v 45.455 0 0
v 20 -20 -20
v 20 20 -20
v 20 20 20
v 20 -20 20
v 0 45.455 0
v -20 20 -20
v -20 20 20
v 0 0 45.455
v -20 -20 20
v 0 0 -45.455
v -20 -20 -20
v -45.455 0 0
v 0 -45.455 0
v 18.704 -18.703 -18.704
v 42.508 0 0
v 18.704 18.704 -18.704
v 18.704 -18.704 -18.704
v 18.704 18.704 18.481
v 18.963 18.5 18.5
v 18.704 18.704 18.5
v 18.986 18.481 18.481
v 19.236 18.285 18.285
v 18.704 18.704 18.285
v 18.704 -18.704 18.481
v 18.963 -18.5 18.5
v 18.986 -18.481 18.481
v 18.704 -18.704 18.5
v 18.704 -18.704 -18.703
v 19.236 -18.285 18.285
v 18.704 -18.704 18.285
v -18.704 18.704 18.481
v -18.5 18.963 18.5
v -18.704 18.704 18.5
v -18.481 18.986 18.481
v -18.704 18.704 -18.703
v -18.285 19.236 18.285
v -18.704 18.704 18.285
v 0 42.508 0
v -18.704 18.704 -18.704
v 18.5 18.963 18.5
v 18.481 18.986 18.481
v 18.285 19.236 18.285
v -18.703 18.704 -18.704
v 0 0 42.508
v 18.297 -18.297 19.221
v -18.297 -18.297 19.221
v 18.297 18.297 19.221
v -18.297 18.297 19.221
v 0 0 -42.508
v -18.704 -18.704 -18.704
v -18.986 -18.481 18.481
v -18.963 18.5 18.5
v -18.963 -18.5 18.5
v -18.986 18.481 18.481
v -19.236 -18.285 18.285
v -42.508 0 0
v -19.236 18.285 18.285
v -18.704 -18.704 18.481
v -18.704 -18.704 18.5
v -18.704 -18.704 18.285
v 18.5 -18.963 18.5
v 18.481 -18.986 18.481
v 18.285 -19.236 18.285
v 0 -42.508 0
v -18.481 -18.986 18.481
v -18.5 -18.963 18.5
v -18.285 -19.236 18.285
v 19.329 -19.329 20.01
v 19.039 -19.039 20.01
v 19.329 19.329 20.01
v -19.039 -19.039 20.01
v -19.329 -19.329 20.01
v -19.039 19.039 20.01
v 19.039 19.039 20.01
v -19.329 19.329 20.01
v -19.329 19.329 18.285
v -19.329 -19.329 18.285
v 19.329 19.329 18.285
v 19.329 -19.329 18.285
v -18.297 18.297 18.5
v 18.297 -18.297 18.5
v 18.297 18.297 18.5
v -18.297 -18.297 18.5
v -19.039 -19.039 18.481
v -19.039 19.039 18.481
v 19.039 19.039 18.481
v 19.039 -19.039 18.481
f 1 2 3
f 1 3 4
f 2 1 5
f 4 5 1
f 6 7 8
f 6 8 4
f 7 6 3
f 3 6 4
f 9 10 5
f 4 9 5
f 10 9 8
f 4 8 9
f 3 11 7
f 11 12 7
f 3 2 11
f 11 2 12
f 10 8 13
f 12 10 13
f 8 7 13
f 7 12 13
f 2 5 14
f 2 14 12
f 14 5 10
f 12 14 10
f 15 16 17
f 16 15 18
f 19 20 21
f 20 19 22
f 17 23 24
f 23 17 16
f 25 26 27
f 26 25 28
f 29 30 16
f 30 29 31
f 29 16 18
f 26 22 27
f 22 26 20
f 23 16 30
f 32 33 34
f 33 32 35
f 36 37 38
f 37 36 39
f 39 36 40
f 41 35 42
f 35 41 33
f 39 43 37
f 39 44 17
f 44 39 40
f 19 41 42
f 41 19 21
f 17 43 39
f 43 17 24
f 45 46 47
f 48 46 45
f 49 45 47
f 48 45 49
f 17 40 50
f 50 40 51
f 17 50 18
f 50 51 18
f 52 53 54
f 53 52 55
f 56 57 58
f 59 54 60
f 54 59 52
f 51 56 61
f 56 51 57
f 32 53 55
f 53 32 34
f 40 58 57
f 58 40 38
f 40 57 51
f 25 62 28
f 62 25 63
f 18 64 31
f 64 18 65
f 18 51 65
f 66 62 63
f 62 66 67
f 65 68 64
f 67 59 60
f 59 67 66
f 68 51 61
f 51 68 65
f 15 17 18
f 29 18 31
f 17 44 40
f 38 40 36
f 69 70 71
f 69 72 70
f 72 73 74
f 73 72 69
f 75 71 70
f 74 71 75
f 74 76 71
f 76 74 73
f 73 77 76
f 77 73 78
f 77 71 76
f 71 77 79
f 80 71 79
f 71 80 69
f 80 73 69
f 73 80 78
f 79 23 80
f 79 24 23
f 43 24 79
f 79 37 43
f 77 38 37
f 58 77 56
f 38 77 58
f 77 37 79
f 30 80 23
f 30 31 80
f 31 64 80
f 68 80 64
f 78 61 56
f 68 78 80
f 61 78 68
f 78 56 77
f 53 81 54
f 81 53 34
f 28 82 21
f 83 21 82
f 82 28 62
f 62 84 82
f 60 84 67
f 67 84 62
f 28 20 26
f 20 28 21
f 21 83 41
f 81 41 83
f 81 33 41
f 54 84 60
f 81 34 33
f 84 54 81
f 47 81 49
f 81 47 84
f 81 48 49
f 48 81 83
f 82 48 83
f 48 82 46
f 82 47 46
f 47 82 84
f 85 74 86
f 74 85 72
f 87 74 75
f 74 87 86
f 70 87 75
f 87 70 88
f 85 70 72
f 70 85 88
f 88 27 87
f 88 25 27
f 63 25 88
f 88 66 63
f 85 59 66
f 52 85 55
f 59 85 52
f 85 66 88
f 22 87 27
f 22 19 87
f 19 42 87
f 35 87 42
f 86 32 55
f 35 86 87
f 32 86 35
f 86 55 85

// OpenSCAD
arete = 40;
hauteur = 25.455; // hauteur pyramide
paroi = 1.5;
echelleReductionAjustementBouchon = 0.985;
libEcho=false;


hauteurInterieure = hauteur - 1.1 * paroi;
areteInterieure = hauteurInterieure * arete / hauteur;

echo(areteInterieure);

//poly_creux();
//decoupe_bouchon();
corps_ouvert();
bouchon();


module corps_ouvert() {
//    rotate([180, 0, 0])
	difference() {
		poly_creux();
		decoupe_bouchon();
	}
}

module bouchon() {
	difference () {
        intersection() {
            union() {
                poly_creux();
                supplement_feuillure_bouchon(echelleReductionAjustementBouchon);
            }
            decoupe_bouchon(echelleReductionAjustementBouchon);
        }
	}
}

module poly_creux() {
	difference() {
        stellated_hexahedron(arete, hauteur);
        stellated_hexahedron(areteInterieure, hauteurInterieure);
	}
}

module decoupe_bouchon(scale=1) {
    distance = arete/2;
    scale2 = 1.15*pow(scale,8);
	rotate([0,0,45]) translate([0,0, distance+0.01])
		cylinder(999, r=arete*0.8, $fn=4, center=false);
	rotate([0,0,45]) translate([0,0, distance-paroi*scale2+0.01])
		cylinder(paroi*scale2, r=(arete-paroi)*0.71*scale, $fn=4, center=false);
}

module supplement_feuillure_bouchon(scale=1) {
    distance = arete/2;
    rotate([0,0,45]) translate([0,0, distance-paroi])
    difference() {   
		cylinder(paroi+1, r=(arete-paroi)*0.71*scale, $fn=4, center=false);
		cylinder(paroi+1, r=(arete-2*paroi)*0.71*scale, $fn=4, center=false);
    }
}

module stellated_hexahedron(side, height) {
    union() {
        cube(side, center=true);
        copy_mirror([1,1,1])
        for (i = [1:3]) {
            rotate(a=360/3*i, v=[1,1,1]) translate([0,0, side/2-0.0001])
            pyramid(side=side, height=height, square=true, centerHorizontal=true, centerVertical=false);
        }
    }
}

module copy_mirror(vec=[0,0,0])
{
    children();
    rotate(a=360/6, v=[1,1,1]) mirror(vec) children();
}




/*   	MY Libraries v1.1 - Common Components
		Unless stated otherwise, all modules
		are by Randy Young <dadick83@hotmail.com>
		2010, 2011.   License, GPL v2 or later
**************************************************/

displayMode= rezScreen();  // (resolution)

function rezPrinter()=0;
function rezScreen()=1;

function resolution(value) =
	displayMode==1 ? 360 : value*2*3.141592; // ~1mm resolution for printer
$fn=resolution(4); // default for cylinder & sphere

function vectorDistance(v1, v2) =
	sqrt((pow(v2[0]-v1[0],2)+pow(v2[1]-v1[1],2))+pow(v2[2]-v1[2],2));
// function for linear measurement from 2, 3d vectors)

ep=0.01; //small number to avoid overlaps (non-manifold models)
in=25.4; //inches to millimeter conversion


/***** ROTATION & TRANSLATION SHORTCUTS  *****
Used for common, easy to type single axis moves 
with names I can actually remember (since I never
get the rotation directions right on first try. :o)   */

function tighten (angle=90) =
		[0,0,-1*angle];

function loosen (angle=90) =
		[0,0,angle];

function righty (angle=90) =
		[0,angle,0];

function lefty (angle=90) =
		[0,-1*angle,0];

function backward (angle=90) =
		[-1*angle,0,0];

function forward (angle=90) =
		[angle,0,0];

function push(distance=1) =
		[0,distance,0]; 

function lift(distance=1) =
		[0,0,distance];

function slide(distance=1) =
		[distance,0,0]; 

/*************************************************
BASIC ENGINEERING SHAPES */

module hex (width=10, height=10, flats= true, center=false){
	radius= (flats == true ? width/sin(60)/2 : width/2 );
		cylinder (r=radius, h=height, center=center, $fn=6);
}

module equilateralTriangle (side=10, height=10, center=false){
	translate(center==true ? [-side/2,-sqrt(3)*side/6,-height/2] : [0,0,0])	
		linear_extrude(height=height)
			polygon(points=[[0,0],[side,0],[side/2,sqrt(3)*side/2]]);
}

module pyramid(side=10, height=-1, square=false, centerHorizontal=true, centerVertical=false){
// creates a 3 or 4 sided pyramid.  -1 height= tetrahedron or Johnson's Solid square pyramid
	mHeight= height!=-1 ? height:
		square == true ? (1/sqrt(2))*side:		//square
			sqrt(6)/3*side;						//tetra
	vert= centerVertical!=true ? [0,0,0]:
		square==false ? [0,0,-mHeight/4] :	 //inscribes a tetra inside a sphere, not 1/2 ht
			[0,0,-mHeight/3];	//for squares, center=false inscribes, so true is just 1/2 ht
	horiz= centerHorizontal!= true ? [0,0,0] :
		square == true ? [-side/2, -side/2, 0] : 	//square
			[-side/2,-sqrt(3)*side/6 ,0];			//tetra
	translate(vert+horiz){
		if (square == true){
			polyhedron (	points = [[0,0,0],[0,side,0],[side,side,0],
								[side,0,0],[side/2,side/2,mHeight]], 
						faces = [[1,0,2], [2,0,3], [0,4,3], 
								[3,4,2], [2,4,1], [1,4,0]]);
		}
		if (square != true){
			polyhedron (	points = [[0,0,0],[side,0,0],[side/2,sqrt(3)*side/2,0],
								[side/2,sqrt(3)*side/6,mHeight]], 
						faces = [[0,1,2], [1,0,3], [2,1,3],[2,3,0]]);			
		}
}	}

module tube(r=2, thickness=1, height=1, center=false, outline=false){
	translate(lift(center == true ?  0 : 0.5*height)) 
	difference(){
		cylinder(r=r, h=height, center=true, $fn=resolution(r));
		if (outline!=true)
			cylinder(r=r-thickness+ep, h=height+2*ep, center=true, $fn=resolution(r-thickness));
}	}

module roundRect (size=[10,10,10], round=3, center=false){
	$fn=resolution(round);
	radius = min(round, size[0]/2, size[1]/2);
	union(){
		translate(center==true ? [-size[0]/2,-size[1]/2,-size[2]/2] : [0,0,0]){
			translate([radius,radius,0])
				cylinder (r=radius, h=size[2]);
			translate([size[0]-radius,radius,0])
				cylinder (r=radius, h=size[2]);
			translate([size[0]-radius,size[1]-radius,0])
				cylinder (r=radius, h=size[2]);
			translate([radius,size[1]-radius,0])
				cylinder (r=radius, h=size[2]);
			translate([0,radius,0]) 
				cube(size-[0,radius*2,0]);
			translate([radius,0,0]) 
				cube(size-[radius*2,0,0]);
}	}	}

module keyhole(r1, r2, length, height) {
	translate ([0,length/2,0]) union(){
		translate ([0,length/2-r1,0]) 
			cylinder (r=r1, height, $fn=resolution(r1));
		translate ([0,0-(length/2-r2),0]) 
			cylinder (r=r2, height, $fn=resolution(r2));
		translate ([-r1,r1-length/2,0]) 
			cube ([r1*2,length-(r1*2),height]);
	}
}

module slot(size=[4,10,1], startRound=true, endRound=true, centerXYZ=[1,0,0]){
	$fn=resolution(size[0]/2);
	radius=size[0]/2;
	start= startRound==true ? radius : 0;
	end= endRound==true ? radius : 0;
	translate([-size[0]/2*centerXYZ[0],
			-size[1]/2*centerXYZ[1],
			-size[2]/2*centerXYZ[2]]) 
	union(){
		translate([0,start,0]) cube (size-[0,start+end,0]);
		if (startRound==true) translate ([radius,radius,0])
			cylinder (r=size[0]/2, h=size[2]);
		if (endRound==true) translate ([radius,size[1]-radius,0])
			cylinder (r=size[0]/2, h=size[2]);
	
}	}

module dovetail (width=9, height=10, male=true){
	w= (male==true) ? width*0.975 : width;
	translate(slide(2.4)) union(){
		rotate(tighten(30))
			equilateralTriangle(w,height, center=true);
		translate(slide(-4.5)) cube([4.2,width*1.5,height], center=true);}
}

module teardrop(radius=5, length=10, angle=90) {
// teardrop module by whosawhatsis <www.thingiverse.com/thing:3457>
// Creative Commons LGPL, 2010.  I added default values and resolution code
	$fn=resolution(radius);
	rotate([0, angle, 0]) union() {
		linear_extrude(height = length, center = true, convexity = radius, twist = 0)
			circle(r = radius, center = true);
		linear_extrude(height = length, center = true, convexity = radius, twist = 0)
			projection(cut = false) rotate([0, -angle, 0]) 
			translate([0, 0, radius * sin(45) * 1.5]) 
			cylinder(h = radius * sin(45), r1 = radius * sin(45), r2 = 0, 
					center = true);
	}
}


/*************************************************
HARDWARE COMPONENTS */

module hexNut(size="M3", center=false, outline=false, pos=[0,0,0]){
	if (tableRow(size) == -1)	echo(str("hexNut ERROR: size of '",size,"' is undefined."));
	width = tableEntry (size, "nutWidth");
	height = tableEntry (size, "nutThickness");
	hole = tableEntry (size, "nutID");
	translate(pos+lift(center == true ?  0 : 0.5*height)) difference(){
		hex(width, height, center=true);
		if (outline!=true)
			cylinder(r=hole/2+0.01, h=height+0.02, center=true, $fn=resolution(hole/2));
}	}

module washer(size="M3", center=false, outline=false, pos=[0,0,0]){
	if (tableRow(size) == -1)	echo(str("washer ERROR: size of '",size,"' is undefined."));
	width = tableEntry (size, "washerOD");
	height = tableEntry (size, "washerThickness");
	hole = tableEntry (size, "washerID");
	translate(pos) tube(width/2,(width-hole)/2,height,center,outline);
}

module capBolt (size="M3", length= 16, center=false, pos=[0,0,0])	{
	if (tableRow(size) == -1)	echo(str("capBolt ERROR: size of '",size,"' is undefined."));
	diameter = tableEntry (size, "headDiameter");
	head = tableEntry (size, "headThickness");
	stud = tableEntry (size, "studDiameter");	
	translate(pos+[0,0,center == true ? -length/2 : 0]) union()	{
		translate(lift(-head)){
			cylinder(r=diameter/2, h=head, $fn=resolution(diameter/2));
			cylinder(r=stud/2, h=length+head, $fn=resolution(stud/2));
}	}	}

module hexBolt (size="M3", length= 16, center=false, pos=[0,0,0])	{
	if (tableRow(size) == -1)	echo(str("hexBolt ERROR: size of '",size,"' is undefined."));
	width = tableEntry (size, "headDiameter");
	head = tableEntry (size, "headThickness");
	stud = tableEntry (size, "studDiameter");	
	translate(pos+[0,0,center == true ? -length/2 : 0]) union()	{
		translate(lift(-head)){
			hex(width, head, $fn=6);
			cylinder(r=stud/2, h=length+head, $fn=resolution(stud/2));
}	}	}

module bearing (size="Skate", center=false, outline=false, pos=[0,0,0]){
// The Elmom MCAD has a much better version of a bearing module.  
// This is a basic donut shape but gets the job done for construction.
	if (tableRow(size) == -1)	echo(str("bearing ERROR: type of '",type,"' is undefined."));
	hole = tableEntry (size, "bearingID");
	thickness = tableEntry (size, "bearingThickness");
	diameter = tableEntry (size, "bearingOD");
	translate(pos) 
		tube(diameter/2, (diameter-hole)/2, thickness, center, outline);
}

/*************************************************
/****  TABLE DATA AND SUPPORT FUNCTIONS		****
The following functions contain various engineering tables but you can add whatever data
you'd like.  I've also used it for translation landmarks.  The table itself is arranged with an array of arrays (vectors) and stored within the "tableRow" function with each row having a string identifier.  Thus, you can retrieve a vector by name without storing a bunch of variables.
	A second array function, called "columnNames" is simply a convenient way to refer to each element within a vector by an element name.  The values overlap, depending on what data type you're working with.  For instance, "bearingWidth" = "headThickness" = z-vector element = 2.
	You can find a specific variable within the data, using "rowElement" that uses row, column strings to identify the element desired.  Uncomment the example below to see it in action. 
						*****/
//testTable();
		module testTable(){
			column = "nutWidth";
			row =	"M3";
			
			echo (str(column," is found in column #",
				columnName(column)	));
			echo (str("The row named ",row," contains: ",
				tableRow(row)		));
			echo (str("The ",column," field of the ",row," row is: ",
				tableEntry(row,column)	));	
		}

function columnName(name)=
	// Bearings
		name == "bearingID" 		? 0 :
		name == "bearingOD" 		? 1 :
		name == "bearingThickness"?2 :
	// Bolts
		name == "studDiameter" 	? 0 :
		name == "headDiameter" 	? 1 :
		name == "headThickness" 	? 2 :
	// Nuts
		name == "nutID"	 		? 0 :
		name == "nutWidth" 		? 3 :
		name == "nutThickness" 	? 4 :
	// Washers
		name == "washerID"	 	? 0 :
		name == "washerOD"	 	? 5 :
		name == "washerThickness"? 6 :
	-1; // Not Found.  Results in Undef fields.

function tableRow (name)=
	// Bearing Names
		name == "606" 		? [6, 13, 6] :
		name == "608" 		? [8, 22, 7] :
		name == "624" 		? [4, 13, 5] :
		name == "Skate" 		? [8, 22, 7] :
	// Bolt, Nut, Washer Sizes
	// It seems hardware size standards are loose, so these dimensions may not match your hardware.
		name == "M2" 		? [2, 4, 2, 4, 1.6, 5.5, 0.3] :		
		name == "M2.5" 		? [2.5, 5, 2.5, 5, 2, 7, 0.5] :		
		name == "M3" 		? [3, 5.5, 3, 5.5, 2.4, 7, 0.5] :		
		name == "M4" 		? [4, 7.0, 4, 7, 3.2, 9, 0.8] :
		name == "M5" 		? [5, 8.5, 5, 8, 4.7, 10, 1] :
		name == "M6" 		? [6, 10, 6, 10, 5.2, 12.5, 1.6 ] :
		name == "M8" 		? [8, 13, 8, 13, 6.8, 17, 1.8] :
		name == "#8"		 	? [0.164*in, 7.1, 0.164*in, 11/32*in, 3.05, in/2, in*0.04] :
		name == "1/4 Hex" 	? [in/4, in*0.505, in*11/64, in*7/16, in*5/32, in*0.734, in*0.063] :
		name == "5/16 Hex"	? [in*5/16, in*0.577, in*7/32, in/2, in*3/16, in*0.875, in*0.063] :
	-1; //Not found in Table

function tableEntry (rowName, fieldName) =
	tableRow(rowName)[columnName(fieldName)];	


/*************************************************
OPENSCAD INTERFACE & EXAMPLES */

libEcho=true;
if (libEcho!=false){ 
	echo ("****************************************************************  ");
	echo ("  'Libs' library loaded. For a list of modules, use libHelp();            ");
	echo ("   For help with translation/rotation functions, use libMoveHelp();");
	echo ("   For examples of each object, use libDemo();                             ");
	echo ("   To turn off this header, place libEcho=false; in your script        ");
	echo ("   libs.scad is @ http://www.thingiverse.com/thing:6021             ");
	echo ("****************** By randyy, 2011, LGPL v2+ ******************  ");
}

module libDemo(){
	translate(slide(15)) pyramid();
	translate(lift(5)) equilateralTriangle(center=true);
	translate(slide(-15)) pyramid(square=true);
	translate(slide(15)+push(15)) tube(5,2, height=10);
	translate([-5,10,0]) roundRect();
	translate([-15,15,0]) hex();
	translate([15,-25,0]) slot([4,15,4],true,false);
	translate([0,-25,0]) keyhole(2,4,15,4);
	translate([-30,-10,0]) hexNut();
	translate([-30,-20,0]) washer();
	translate([-30,0,tableEntry("#8","headThickness")]) capBolt("M3",12);
	translate([-30,15,tableEntry("#8","headThickness")]) hexBolt("#8",12);
	translate([-15,-18,0]) rotate(tighten()) dovetail(9,4);
}

module libHelp(){
	echo();
	echo("  ***********************   libHelp   **************************");
	echo("  displayMode= 1;  // 0=printer, 1=screen (resolution)  ");
	echo("  hex (width=10, height=10, flats= true, center=false)  ");
	echo("  equilateralTriangle (side=10, height=10, center=false)  ");
	echo("  pyramid(side=10, height=-1, square=false, centerHorizontal=true, centerVertical=false)  ");
	echo("  tube(r=2, thickness=1, height=1, center=false, outline=false)  ");
	echo("  roundRect (size=[10,10,10], round=3, center=false)  ");
	echo("  keyhole(r1, r2, length, height)  ");
	echo("  slot(size=[4,10,1], startRound=true, endRound=true, centerXYZ=[1,0,0])  ");
	echo("  dovetail (width=9, height=10, male=true)  ");
	echo("  teardrop(radius=5, length=10, angle=90)  ");
	echo("  hexNut(size='M3', center=false, outline=false, pos=[0,0,0])  ");
	echo("  washer(size='M3', center=false, outline=false, pos=[0,0,0])  ");
	echo("  capBolt (size='M3', length= 16, center=false, pos=[0,0,0])  ");
	echo("  hexBolt (size='M3', length= 16, center=false, pos=[0,0,0])  ");
	echo("  bearing (size='Skate', center=false, outline=false, pos=[0,0,0])  ");
	echo("  TABLE FUNCTIONS  ");
	echo("  function columnName(name)  ");
	echo("  function tableRow (name)  ");
	echo("  function tableEntry (rowName, fieldName)  ");
	echo();
}

module libMoveHelp(){
	echo();
	echo("  *********************   libMoveHelp   ************************");
	echo("  ROTATION - default is 90 degrees, but you can use any value in ().  ");
	echo("     tighten(), clockwise, along z                                                       ");
	echo("     loosen(), counterclockwise, along z                                            ");
	echo("     righty(), leans right, along y axis                                                ");
	echo("     lefty(), leans left, along y axis                                                     ");
	echo("     backward() falls away, along x axis                                             ");
	echo("     forward() falls toward you, along x axis                                      ");
	echo("  TRANSLATION - negative numbers move in opposite direction      ");
	echo("     push(distance) moves object away, along y                                 ");
	echo("     lift(distance) moves object up, along z                                        ");
	echo("     slide(distance) moves object right, along x                                 ");
	echo();
}
